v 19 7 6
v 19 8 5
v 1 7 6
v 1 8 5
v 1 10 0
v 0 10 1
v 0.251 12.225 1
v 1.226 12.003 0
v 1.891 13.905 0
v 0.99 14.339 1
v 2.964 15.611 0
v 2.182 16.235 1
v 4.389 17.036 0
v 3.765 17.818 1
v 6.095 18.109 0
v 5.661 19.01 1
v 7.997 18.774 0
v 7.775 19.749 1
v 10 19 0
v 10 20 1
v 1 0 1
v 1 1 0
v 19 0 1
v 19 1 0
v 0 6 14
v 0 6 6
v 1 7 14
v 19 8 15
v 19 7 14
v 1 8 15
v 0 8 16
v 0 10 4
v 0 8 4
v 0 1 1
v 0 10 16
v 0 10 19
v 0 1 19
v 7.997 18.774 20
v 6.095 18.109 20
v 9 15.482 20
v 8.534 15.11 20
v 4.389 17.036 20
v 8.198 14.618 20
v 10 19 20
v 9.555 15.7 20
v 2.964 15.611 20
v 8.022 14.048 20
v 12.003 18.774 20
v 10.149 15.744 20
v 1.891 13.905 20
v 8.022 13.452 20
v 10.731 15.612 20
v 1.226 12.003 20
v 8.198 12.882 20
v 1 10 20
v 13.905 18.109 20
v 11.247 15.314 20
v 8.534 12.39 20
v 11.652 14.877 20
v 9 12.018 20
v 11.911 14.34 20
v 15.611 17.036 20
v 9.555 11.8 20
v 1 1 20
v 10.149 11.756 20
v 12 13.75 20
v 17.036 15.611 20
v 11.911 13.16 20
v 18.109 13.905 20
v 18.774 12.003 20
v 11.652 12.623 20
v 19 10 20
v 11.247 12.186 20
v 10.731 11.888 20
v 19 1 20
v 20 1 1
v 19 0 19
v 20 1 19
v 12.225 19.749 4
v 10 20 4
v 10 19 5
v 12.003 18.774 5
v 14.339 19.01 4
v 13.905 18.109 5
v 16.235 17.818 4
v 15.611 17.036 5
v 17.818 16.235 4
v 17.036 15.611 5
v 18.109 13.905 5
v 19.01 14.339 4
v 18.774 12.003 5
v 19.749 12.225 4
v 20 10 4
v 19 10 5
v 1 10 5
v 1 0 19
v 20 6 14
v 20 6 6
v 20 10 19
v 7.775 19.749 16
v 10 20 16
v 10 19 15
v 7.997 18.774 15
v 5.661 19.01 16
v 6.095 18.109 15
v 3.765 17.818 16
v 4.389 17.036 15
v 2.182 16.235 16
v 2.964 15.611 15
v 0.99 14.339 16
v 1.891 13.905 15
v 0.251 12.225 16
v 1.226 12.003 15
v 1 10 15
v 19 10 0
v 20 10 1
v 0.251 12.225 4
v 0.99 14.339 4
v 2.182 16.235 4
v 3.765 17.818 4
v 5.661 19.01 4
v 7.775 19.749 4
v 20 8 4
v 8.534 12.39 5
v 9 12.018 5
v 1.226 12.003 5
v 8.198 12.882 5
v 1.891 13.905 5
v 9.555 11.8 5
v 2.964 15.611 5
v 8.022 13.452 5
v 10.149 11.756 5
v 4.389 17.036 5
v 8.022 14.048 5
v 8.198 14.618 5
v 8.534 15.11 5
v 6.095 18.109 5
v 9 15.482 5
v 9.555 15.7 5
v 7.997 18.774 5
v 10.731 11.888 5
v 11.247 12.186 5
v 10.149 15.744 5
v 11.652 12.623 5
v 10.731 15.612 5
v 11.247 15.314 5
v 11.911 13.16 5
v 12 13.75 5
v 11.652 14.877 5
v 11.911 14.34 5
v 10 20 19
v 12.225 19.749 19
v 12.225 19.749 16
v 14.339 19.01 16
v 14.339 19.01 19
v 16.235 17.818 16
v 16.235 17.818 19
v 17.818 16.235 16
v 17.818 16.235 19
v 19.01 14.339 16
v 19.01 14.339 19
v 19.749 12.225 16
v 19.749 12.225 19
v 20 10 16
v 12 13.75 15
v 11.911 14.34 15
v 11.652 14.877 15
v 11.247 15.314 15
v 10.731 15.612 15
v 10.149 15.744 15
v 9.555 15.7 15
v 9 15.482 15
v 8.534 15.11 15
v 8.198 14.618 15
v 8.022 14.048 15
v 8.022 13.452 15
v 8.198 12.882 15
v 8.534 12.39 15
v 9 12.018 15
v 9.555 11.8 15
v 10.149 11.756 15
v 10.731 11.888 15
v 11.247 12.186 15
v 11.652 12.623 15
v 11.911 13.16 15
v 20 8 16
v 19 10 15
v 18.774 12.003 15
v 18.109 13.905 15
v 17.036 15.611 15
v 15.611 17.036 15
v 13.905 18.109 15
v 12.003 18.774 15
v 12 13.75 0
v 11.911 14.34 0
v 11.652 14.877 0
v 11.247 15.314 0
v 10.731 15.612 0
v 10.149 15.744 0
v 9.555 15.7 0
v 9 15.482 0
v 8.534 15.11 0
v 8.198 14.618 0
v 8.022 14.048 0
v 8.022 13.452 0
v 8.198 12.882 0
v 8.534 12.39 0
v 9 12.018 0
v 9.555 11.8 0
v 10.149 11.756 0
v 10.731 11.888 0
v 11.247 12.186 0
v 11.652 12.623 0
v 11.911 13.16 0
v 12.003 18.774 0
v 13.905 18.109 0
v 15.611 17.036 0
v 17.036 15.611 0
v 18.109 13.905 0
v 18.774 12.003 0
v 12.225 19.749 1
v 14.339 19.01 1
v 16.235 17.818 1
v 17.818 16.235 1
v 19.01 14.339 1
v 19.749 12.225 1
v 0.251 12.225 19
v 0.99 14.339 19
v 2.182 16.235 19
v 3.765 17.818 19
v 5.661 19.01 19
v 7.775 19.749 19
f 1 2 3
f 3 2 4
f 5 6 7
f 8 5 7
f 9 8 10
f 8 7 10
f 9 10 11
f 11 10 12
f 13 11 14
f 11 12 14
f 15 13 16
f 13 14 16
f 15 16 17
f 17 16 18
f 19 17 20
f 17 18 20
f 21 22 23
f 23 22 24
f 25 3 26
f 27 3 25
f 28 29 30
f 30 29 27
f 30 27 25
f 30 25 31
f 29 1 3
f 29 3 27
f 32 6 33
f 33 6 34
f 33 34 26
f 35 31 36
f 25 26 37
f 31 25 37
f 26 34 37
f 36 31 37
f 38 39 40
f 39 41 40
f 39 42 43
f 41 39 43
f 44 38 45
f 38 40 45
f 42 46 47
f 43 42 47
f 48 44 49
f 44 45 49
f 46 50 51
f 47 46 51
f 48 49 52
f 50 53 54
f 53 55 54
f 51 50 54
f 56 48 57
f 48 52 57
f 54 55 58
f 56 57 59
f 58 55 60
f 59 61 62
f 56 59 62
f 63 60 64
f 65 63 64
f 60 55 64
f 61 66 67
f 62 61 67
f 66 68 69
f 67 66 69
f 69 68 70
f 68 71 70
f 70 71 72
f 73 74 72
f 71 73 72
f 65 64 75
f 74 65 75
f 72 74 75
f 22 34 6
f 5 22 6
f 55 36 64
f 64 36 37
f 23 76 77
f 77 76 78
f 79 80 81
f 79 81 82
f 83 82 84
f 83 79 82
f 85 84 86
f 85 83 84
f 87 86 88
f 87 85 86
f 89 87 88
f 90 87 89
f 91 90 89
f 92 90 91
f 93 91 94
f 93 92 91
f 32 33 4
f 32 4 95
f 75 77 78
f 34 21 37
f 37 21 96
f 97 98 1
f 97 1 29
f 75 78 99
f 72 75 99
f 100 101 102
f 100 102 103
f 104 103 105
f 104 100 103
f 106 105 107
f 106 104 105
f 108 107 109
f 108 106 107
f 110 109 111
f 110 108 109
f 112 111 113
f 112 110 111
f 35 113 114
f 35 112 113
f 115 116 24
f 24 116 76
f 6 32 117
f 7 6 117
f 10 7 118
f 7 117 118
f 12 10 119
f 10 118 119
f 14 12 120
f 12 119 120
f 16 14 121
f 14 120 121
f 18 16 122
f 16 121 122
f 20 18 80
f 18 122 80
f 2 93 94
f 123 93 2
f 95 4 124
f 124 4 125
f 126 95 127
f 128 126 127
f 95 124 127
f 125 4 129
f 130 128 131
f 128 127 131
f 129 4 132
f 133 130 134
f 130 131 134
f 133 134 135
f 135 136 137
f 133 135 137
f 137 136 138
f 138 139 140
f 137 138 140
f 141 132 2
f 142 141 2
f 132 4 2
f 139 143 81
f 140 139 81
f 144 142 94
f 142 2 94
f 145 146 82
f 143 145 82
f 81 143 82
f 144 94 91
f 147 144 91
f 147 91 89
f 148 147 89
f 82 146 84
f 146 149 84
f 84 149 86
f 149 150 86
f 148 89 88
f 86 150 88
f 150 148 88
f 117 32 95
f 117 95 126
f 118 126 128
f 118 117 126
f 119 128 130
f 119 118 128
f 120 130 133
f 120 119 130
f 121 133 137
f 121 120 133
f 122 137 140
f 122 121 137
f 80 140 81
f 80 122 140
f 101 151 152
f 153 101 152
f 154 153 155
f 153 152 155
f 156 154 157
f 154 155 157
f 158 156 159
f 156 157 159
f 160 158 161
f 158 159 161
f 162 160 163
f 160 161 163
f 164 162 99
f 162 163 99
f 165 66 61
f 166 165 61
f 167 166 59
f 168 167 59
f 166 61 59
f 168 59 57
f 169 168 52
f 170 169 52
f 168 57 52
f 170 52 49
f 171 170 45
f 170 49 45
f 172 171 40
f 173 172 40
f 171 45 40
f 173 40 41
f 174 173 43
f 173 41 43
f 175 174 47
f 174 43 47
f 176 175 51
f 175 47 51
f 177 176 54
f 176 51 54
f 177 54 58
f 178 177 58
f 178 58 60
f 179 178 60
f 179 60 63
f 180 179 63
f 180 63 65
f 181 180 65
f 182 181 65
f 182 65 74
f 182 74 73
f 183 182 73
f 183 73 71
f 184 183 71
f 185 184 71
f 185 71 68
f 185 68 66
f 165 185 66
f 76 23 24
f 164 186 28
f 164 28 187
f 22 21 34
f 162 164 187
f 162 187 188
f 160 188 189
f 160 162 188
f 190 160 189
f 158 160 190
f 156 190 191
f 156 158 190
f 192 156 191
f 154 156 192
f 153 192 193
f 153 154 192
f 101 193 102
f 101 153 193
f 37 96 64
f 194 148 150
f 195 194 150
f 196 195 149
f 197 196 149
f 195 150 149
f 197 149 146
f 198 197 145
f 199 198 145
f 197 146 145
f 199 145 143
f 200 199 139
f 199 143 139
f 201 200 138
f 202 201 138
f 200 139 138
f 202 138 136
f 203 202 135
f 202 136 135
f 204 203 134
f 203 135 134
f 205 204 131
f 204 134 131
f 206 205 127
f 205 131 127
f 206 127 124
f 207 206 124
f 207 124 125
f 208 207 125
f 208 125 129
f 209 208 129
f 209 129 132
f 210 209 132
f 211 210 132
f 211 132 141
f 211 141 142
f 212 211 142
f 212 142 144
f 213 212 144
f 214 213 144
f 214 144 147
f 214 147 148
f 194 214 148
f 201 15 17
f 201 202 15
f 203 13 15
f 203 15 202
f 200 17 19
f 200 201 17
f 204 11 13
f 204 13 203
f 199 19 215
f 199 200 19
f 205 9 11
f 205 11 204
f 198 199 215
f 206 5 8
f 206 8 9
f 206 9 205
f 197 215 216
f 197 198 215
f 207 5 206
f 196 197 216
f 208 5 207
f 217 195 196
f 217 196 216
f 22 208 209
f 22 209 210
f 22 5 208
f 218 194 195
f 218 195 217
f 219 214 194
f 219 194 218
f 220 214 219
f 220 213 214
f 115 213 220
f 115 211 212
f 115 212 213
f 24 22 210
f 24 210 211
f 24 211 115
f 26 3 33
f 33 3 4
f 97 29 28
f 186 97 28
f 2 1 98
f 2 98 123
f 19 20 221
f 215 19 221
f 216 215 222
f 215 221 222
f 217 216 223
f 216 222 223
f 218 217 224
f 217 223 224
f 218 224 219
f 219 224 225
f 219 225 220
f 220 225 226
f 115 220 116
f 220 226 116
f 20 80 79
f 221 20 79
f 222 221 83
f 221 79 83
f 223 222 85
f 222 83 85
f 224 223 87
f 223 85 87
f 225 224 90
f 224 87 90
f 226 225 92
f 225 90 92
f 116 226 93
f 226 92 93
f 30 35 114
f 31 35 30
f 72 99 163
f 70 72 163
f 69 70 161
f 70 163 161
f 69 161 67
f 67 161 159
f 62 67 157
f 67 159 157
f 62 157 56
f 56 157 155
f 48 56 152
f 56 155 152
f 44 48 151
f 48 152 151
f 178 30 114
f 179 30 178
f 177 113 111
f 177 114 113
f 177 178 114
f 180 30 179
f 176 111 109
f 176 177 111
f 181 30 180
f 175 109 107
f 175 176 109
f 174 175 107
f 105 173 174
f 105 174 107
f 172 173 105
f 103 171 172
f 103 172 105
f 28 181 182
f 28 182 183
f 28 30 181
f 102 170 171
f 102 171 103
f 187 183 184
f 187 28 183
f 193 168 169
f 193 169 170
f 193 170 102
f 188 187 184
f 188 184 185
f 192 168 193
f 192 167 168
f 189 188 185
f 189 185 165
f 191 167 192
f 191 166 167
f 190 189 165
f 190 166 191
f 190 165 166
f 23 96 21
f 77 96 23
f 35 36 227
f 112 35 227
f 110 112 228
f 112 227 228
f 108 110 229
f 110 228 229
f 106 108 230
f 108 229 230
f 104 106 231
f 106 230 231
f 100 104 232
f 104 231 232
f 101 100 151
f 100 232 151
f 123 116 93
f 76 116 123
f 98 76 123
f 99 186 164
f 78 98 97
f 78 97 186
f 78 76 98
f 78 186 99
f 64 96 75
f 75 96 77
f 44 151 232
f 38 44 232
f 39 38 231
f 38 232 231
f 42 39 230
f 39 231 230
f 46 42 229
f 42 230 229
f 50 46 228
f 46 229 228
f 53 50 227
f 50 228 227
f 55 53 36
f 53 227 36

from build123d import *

# Parameters (mm, degrees)
F0_W     = 20
F0_H     = 20
F1_DEPTH = 20
F2_W     = 13
F2_H     = 10
F3_DEPTH = 20
F4_R     = 2
F5_DEPTH = 20
F6_R     = 9.99999
F7_SIZE  = 1


# Not quite as in the source:
# - a fillet or chamfer is up to 0.001 mm smaller than in the source, because OpenCascade refuses the exact size


with BuildPart() as f1:
    # F0 (on Front) → F1 (new body)
    with BuildSketch(Plane.XZ):
        with Locations((10, 10)):
            Rectangle(F0_W, F0_H)
    extrude(amount=-F1_DEPTH)

    # F2 (on face) → F3 (cut, through all)
    with BuildSketch(Plane.YZ.offset(20)):
        with Locations((13.5, 10)):
            Rectangle(F2_W, F2_H)
    extrude(amount=-F3_DEPTH, mode=Mode.SUBTRACT)

    # F4 (on face) → F5 (cut, through all)
    with BuildSketch(Plane.XY.offset(20)):
        with Locations((10, 13.75)):
            Circle(F4_R)
    extrude(amount=-F5_DEPTH, mode=Mode.SUBTRACT)

    # F6 (radius 10 in the source; OpenCascade refuses exactly that, so slightly less here)
    f6_edges = [f1.edges().sort_by_distance(p)[0] for p in [
        (0, 20, 2.5),
        (20, 20, 2.5),
        (20, 20, 17.5),
        (0, 20, 17.5),
    ]]
    fillet(f6_edges, radius=F6_R)

    # F7
    f7_edges = [f1.edges().sort_by_distance(p)[0] for p in [
        (0, 0, 10),
        (10, 0, 0),
        (20, 0, 10),
        (10, 0, 20),
        (10, 7, 15),
        (10, 7, 5),
        (20, 7, 10),
        (0, 7, 10),
        (17.071071, 17.071071, 0),
        (10.00001, 20, 2.5),
        (20, 10.00001, 2.5),
        (17.071071, 17.071071, 5),
        (20, 5.000005, 20),
        (20, 10.00001, 17.5),
        (20, 8.500005, 15),
        (20, 5.000005, 0),
        (20, 8.500005, 5),
        (17.071071, 17.071071, 15),
        (10.00001, 20, 17.5),
        (17.071071, 17.071071, 20),
    ]]
    chamfer(f7_edges, length=F7_SIZE)


solid = f1.part
